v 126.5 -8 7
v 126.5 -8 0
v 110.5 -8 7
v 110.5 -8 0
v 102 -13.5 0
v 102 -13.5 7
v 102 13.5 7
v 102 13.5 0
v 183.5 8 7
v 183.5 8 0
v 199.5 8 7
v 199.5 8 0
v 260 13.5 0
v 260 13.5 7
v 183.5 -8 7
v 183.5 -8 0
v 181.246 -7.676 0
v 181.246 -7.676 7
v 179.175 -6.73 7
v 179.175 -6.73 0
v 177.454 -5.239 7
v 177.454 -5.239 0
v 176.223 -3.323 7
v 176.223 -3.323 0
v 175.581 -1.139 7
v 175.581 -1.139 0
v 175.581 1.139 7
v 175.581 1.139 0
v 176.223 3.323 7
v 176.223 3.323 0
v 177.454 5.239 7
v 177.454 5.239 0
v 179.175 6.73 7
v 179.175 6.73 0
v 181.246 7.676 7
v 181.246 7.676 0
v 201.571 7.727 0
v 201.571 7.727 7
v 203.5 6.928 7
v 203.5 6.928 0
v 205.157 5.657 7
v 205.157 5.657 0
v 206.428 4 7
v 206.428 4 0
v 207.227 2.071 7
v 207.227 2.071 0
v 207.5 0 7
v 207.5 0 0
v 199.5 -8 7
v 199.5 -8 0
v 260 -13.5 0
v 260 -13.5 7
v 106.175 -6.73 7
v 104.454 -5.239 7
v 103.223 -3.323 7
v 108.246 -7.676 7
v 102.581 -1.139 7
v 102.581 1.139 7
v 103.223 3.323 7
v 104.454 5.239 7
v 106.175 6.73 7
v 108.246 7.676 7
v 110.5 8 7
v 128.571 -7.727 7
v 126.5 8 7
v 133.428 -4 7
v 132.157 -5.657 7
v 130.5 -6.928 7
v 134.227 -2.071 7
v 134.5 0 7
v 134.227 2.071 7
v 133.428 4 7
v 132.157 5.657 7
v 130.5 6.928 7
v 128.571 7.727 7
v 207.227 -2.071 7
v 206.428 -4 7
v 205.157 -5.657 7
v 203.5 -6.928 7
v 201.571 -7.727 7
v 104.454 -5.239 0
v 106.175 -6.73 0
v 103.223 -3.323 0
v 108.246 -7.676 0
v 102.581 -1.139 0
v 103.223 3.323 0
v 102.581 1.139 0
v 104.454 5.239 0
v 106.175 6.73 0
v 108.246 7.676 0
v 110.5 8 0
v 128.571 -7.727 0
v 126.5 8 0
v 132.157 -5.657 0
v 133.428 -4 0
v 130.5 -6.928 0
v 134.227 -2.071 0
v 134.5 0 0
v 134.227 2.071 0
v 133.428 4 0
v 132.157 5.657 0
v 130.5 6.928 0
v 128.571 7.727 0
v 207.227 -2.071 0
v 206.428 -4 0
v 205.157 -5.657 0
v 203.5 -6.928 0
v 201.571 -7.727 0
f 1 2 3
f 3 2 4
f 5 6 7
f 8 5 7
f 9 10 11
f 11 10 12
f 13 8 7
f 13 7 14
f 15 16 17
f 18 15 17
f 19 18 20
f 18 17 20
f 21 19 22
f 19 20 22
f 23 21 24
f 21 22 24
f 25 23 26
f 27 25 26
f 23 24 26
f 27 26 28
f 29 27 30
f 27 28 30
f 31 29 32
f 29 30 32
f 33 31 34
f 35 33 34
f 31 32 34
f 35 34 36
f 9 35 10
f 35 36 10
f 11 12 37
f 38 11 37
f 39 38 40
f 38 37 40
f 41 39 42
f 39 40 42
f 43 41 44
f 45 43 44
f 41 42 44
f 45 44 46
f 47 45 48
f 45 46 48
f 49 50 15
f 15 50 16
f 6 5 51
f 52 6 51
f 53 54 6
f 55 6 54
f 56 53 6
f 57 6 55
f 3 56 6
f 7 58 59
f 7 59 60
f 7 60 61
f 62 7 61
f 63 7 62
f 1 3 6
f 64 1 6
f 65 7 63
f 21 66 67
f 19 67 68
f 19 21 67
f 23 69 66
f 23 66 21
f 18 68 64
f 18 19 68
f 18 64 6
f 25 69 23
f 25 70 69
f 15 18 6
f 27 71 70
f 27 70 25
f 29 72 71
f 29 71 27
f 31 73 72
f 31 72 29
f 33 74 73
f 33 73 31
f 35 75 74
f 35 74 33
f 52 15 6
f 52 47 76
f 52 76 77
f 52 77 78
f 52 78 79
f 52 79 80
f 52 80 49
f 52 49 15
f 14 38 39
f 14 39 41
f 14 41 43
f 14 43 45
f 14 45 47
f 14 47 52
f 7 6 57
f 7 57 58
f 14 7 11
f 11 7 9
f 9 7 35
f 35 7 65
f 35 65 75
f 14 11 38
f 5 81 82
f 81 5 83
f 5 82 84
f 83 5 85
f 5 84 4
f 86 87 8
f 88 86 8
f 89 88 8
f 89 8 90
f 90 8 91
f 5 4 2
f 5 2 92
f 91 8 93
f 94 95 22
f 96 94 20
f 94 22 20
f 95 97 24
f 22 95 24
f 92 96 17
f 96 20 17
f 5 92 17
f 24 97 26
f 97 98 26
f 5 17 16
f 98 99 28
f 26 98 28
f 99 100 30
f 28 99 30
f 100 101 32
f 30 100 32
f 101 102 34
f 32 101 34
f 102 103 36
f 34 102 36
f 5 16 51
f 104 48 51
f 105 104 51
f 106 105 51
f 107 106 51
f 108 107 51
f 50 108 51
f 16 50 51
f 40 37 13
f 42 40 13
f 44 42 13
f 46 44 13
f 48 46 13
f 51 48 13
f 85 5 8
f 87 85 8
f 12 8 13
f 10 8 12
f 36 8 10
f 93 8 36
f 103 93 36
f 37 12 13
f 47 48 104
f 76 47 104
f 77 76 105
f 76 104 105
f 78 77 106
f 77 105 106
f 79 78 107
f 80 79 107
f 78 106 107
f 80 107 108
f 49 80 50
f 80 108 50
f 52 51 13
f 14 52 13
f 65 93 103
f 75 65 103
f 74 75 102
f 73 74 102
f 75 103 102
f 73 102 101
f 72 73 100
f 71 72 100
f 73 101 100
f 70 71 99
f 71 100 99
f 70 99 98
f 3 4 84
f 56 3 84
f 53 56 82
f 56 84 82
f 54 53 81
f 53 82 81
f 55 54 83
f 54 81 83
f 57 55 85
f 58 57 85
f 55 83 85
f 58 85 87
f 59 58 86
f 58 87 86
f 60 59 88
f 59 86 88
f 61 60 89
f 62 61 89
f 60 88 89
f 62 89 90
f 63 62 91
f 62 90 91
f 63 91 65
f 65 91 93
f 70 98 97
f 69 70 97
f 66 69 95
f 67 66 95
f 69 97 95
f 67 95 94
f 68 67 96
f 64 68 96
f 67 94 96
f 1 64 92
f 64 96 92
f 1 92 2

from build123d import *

# Parameters (mm, degrees)
F0_W     = 520
F0_H     = 27
F1_DEPTH = 7
F2_W     = 158
F2_H     = 96.179498
F2_W_2   = 50
F3_DEPTH = 25


with BuildPart() as f1:
    # F0 (on Top) → F1 (new body)
    with BuildSketch(Plane.XY):
        Rectangle(F0_W, F0_H)
        with BuildLine():
            ThreePointArc((-92.5, 8), (-86.843146, 5.656854), (-84.5, 0))
            ThreePointArc((-84.5, 0), (-86.843146, -5.656854), (-92.5, -8))
            Line((-92.5, -8), (-108.5, -8))
            ThreePointArc((-108.5, -8), (-116.5, 0), (-108.5, 8))
            Line((-108.5, 8), (-92.5, 8))
        make_face(mode=Mode.SUBTRACT)
        with BuildLine():
            ThreePointArc((-19.5, 8), (-13.843146, 5.656854), (-11.5, 0))
            ThreePointArc((-11.5, 0), (-13.843146, -5.656854), (-19.5, -8))
            Line((-19.5, -8), (-35.5, -8))
            ThreePointArc((-35.5, -8), (-43.5, 0), (-35.5, 8))
            Line((-35.5, 8), (-19.5, 8))
        make_face(mode=Mode.SUBTRACT)
        with BuildLine():
            ThreePointArc((53.5, 8), (59.156854, 5.656854), (61.5, 0))
            ThreePointArc((61.5, 0), (59.156854, -5.656854), (53.5, -8))
            Line((53.5, -8), (37.5, -8))
            ThreePointArc((37.5, -8), (29.5, 0), (37.5, 8))
            Line((37.5, 8), (53.5, 8))
        make_face(mode=Mode.SUBTRACT)
        with BuildLine():
            ThreePointArc((126.5, 8), (132.156854, 5.656854), (134.5, 0))
            ThreePointArc((134.5, 0), (132.156854, -5.656854), (126.5, -8))
            Line((126.5, -8), (110.5, -8))
            ThreePointArc((110.5, -8), (102.5, 0), (110.5, 8))
            Line((110.5, 8), (126.5, 8))
        make_face(mode=Mode.SUBTRACT)
        with BuildLine():
            ThreePointArc((199.5, 8), (205.156854, 5.656854), (207.5, 0))
            ThreePointArc((207.5, 0), (205.156854, -5.656854), (199.5, -8))
            Line((199.5, -8), (183.5, -8))
            ThreePointArc((183.5, -8), (175.5, 0), (183.5, 8))
            Line((183.5, 8), (199.5, 8))
        make_face(mode=Mode.SUBTRACT)
    extrude(amount=F1_DEPTH)

    # F2 (on face) → F3 (cut)
    with BuildSketch(Plane.XY.offset(7)):
        with Locations((23, -3.07426)):
            Rectangle(F2_W, F2_H)
        with Locations((-135, -3.07426)):
            Rectangle(F2_W, F2_H)
        with Locations((-239, -3.07426)):
            Rectangle(F2_W_2, F2_H)
    extrude(amount=-F3_DEPTH, mode=Mode.SUBTRACT)


solid = f1.part
